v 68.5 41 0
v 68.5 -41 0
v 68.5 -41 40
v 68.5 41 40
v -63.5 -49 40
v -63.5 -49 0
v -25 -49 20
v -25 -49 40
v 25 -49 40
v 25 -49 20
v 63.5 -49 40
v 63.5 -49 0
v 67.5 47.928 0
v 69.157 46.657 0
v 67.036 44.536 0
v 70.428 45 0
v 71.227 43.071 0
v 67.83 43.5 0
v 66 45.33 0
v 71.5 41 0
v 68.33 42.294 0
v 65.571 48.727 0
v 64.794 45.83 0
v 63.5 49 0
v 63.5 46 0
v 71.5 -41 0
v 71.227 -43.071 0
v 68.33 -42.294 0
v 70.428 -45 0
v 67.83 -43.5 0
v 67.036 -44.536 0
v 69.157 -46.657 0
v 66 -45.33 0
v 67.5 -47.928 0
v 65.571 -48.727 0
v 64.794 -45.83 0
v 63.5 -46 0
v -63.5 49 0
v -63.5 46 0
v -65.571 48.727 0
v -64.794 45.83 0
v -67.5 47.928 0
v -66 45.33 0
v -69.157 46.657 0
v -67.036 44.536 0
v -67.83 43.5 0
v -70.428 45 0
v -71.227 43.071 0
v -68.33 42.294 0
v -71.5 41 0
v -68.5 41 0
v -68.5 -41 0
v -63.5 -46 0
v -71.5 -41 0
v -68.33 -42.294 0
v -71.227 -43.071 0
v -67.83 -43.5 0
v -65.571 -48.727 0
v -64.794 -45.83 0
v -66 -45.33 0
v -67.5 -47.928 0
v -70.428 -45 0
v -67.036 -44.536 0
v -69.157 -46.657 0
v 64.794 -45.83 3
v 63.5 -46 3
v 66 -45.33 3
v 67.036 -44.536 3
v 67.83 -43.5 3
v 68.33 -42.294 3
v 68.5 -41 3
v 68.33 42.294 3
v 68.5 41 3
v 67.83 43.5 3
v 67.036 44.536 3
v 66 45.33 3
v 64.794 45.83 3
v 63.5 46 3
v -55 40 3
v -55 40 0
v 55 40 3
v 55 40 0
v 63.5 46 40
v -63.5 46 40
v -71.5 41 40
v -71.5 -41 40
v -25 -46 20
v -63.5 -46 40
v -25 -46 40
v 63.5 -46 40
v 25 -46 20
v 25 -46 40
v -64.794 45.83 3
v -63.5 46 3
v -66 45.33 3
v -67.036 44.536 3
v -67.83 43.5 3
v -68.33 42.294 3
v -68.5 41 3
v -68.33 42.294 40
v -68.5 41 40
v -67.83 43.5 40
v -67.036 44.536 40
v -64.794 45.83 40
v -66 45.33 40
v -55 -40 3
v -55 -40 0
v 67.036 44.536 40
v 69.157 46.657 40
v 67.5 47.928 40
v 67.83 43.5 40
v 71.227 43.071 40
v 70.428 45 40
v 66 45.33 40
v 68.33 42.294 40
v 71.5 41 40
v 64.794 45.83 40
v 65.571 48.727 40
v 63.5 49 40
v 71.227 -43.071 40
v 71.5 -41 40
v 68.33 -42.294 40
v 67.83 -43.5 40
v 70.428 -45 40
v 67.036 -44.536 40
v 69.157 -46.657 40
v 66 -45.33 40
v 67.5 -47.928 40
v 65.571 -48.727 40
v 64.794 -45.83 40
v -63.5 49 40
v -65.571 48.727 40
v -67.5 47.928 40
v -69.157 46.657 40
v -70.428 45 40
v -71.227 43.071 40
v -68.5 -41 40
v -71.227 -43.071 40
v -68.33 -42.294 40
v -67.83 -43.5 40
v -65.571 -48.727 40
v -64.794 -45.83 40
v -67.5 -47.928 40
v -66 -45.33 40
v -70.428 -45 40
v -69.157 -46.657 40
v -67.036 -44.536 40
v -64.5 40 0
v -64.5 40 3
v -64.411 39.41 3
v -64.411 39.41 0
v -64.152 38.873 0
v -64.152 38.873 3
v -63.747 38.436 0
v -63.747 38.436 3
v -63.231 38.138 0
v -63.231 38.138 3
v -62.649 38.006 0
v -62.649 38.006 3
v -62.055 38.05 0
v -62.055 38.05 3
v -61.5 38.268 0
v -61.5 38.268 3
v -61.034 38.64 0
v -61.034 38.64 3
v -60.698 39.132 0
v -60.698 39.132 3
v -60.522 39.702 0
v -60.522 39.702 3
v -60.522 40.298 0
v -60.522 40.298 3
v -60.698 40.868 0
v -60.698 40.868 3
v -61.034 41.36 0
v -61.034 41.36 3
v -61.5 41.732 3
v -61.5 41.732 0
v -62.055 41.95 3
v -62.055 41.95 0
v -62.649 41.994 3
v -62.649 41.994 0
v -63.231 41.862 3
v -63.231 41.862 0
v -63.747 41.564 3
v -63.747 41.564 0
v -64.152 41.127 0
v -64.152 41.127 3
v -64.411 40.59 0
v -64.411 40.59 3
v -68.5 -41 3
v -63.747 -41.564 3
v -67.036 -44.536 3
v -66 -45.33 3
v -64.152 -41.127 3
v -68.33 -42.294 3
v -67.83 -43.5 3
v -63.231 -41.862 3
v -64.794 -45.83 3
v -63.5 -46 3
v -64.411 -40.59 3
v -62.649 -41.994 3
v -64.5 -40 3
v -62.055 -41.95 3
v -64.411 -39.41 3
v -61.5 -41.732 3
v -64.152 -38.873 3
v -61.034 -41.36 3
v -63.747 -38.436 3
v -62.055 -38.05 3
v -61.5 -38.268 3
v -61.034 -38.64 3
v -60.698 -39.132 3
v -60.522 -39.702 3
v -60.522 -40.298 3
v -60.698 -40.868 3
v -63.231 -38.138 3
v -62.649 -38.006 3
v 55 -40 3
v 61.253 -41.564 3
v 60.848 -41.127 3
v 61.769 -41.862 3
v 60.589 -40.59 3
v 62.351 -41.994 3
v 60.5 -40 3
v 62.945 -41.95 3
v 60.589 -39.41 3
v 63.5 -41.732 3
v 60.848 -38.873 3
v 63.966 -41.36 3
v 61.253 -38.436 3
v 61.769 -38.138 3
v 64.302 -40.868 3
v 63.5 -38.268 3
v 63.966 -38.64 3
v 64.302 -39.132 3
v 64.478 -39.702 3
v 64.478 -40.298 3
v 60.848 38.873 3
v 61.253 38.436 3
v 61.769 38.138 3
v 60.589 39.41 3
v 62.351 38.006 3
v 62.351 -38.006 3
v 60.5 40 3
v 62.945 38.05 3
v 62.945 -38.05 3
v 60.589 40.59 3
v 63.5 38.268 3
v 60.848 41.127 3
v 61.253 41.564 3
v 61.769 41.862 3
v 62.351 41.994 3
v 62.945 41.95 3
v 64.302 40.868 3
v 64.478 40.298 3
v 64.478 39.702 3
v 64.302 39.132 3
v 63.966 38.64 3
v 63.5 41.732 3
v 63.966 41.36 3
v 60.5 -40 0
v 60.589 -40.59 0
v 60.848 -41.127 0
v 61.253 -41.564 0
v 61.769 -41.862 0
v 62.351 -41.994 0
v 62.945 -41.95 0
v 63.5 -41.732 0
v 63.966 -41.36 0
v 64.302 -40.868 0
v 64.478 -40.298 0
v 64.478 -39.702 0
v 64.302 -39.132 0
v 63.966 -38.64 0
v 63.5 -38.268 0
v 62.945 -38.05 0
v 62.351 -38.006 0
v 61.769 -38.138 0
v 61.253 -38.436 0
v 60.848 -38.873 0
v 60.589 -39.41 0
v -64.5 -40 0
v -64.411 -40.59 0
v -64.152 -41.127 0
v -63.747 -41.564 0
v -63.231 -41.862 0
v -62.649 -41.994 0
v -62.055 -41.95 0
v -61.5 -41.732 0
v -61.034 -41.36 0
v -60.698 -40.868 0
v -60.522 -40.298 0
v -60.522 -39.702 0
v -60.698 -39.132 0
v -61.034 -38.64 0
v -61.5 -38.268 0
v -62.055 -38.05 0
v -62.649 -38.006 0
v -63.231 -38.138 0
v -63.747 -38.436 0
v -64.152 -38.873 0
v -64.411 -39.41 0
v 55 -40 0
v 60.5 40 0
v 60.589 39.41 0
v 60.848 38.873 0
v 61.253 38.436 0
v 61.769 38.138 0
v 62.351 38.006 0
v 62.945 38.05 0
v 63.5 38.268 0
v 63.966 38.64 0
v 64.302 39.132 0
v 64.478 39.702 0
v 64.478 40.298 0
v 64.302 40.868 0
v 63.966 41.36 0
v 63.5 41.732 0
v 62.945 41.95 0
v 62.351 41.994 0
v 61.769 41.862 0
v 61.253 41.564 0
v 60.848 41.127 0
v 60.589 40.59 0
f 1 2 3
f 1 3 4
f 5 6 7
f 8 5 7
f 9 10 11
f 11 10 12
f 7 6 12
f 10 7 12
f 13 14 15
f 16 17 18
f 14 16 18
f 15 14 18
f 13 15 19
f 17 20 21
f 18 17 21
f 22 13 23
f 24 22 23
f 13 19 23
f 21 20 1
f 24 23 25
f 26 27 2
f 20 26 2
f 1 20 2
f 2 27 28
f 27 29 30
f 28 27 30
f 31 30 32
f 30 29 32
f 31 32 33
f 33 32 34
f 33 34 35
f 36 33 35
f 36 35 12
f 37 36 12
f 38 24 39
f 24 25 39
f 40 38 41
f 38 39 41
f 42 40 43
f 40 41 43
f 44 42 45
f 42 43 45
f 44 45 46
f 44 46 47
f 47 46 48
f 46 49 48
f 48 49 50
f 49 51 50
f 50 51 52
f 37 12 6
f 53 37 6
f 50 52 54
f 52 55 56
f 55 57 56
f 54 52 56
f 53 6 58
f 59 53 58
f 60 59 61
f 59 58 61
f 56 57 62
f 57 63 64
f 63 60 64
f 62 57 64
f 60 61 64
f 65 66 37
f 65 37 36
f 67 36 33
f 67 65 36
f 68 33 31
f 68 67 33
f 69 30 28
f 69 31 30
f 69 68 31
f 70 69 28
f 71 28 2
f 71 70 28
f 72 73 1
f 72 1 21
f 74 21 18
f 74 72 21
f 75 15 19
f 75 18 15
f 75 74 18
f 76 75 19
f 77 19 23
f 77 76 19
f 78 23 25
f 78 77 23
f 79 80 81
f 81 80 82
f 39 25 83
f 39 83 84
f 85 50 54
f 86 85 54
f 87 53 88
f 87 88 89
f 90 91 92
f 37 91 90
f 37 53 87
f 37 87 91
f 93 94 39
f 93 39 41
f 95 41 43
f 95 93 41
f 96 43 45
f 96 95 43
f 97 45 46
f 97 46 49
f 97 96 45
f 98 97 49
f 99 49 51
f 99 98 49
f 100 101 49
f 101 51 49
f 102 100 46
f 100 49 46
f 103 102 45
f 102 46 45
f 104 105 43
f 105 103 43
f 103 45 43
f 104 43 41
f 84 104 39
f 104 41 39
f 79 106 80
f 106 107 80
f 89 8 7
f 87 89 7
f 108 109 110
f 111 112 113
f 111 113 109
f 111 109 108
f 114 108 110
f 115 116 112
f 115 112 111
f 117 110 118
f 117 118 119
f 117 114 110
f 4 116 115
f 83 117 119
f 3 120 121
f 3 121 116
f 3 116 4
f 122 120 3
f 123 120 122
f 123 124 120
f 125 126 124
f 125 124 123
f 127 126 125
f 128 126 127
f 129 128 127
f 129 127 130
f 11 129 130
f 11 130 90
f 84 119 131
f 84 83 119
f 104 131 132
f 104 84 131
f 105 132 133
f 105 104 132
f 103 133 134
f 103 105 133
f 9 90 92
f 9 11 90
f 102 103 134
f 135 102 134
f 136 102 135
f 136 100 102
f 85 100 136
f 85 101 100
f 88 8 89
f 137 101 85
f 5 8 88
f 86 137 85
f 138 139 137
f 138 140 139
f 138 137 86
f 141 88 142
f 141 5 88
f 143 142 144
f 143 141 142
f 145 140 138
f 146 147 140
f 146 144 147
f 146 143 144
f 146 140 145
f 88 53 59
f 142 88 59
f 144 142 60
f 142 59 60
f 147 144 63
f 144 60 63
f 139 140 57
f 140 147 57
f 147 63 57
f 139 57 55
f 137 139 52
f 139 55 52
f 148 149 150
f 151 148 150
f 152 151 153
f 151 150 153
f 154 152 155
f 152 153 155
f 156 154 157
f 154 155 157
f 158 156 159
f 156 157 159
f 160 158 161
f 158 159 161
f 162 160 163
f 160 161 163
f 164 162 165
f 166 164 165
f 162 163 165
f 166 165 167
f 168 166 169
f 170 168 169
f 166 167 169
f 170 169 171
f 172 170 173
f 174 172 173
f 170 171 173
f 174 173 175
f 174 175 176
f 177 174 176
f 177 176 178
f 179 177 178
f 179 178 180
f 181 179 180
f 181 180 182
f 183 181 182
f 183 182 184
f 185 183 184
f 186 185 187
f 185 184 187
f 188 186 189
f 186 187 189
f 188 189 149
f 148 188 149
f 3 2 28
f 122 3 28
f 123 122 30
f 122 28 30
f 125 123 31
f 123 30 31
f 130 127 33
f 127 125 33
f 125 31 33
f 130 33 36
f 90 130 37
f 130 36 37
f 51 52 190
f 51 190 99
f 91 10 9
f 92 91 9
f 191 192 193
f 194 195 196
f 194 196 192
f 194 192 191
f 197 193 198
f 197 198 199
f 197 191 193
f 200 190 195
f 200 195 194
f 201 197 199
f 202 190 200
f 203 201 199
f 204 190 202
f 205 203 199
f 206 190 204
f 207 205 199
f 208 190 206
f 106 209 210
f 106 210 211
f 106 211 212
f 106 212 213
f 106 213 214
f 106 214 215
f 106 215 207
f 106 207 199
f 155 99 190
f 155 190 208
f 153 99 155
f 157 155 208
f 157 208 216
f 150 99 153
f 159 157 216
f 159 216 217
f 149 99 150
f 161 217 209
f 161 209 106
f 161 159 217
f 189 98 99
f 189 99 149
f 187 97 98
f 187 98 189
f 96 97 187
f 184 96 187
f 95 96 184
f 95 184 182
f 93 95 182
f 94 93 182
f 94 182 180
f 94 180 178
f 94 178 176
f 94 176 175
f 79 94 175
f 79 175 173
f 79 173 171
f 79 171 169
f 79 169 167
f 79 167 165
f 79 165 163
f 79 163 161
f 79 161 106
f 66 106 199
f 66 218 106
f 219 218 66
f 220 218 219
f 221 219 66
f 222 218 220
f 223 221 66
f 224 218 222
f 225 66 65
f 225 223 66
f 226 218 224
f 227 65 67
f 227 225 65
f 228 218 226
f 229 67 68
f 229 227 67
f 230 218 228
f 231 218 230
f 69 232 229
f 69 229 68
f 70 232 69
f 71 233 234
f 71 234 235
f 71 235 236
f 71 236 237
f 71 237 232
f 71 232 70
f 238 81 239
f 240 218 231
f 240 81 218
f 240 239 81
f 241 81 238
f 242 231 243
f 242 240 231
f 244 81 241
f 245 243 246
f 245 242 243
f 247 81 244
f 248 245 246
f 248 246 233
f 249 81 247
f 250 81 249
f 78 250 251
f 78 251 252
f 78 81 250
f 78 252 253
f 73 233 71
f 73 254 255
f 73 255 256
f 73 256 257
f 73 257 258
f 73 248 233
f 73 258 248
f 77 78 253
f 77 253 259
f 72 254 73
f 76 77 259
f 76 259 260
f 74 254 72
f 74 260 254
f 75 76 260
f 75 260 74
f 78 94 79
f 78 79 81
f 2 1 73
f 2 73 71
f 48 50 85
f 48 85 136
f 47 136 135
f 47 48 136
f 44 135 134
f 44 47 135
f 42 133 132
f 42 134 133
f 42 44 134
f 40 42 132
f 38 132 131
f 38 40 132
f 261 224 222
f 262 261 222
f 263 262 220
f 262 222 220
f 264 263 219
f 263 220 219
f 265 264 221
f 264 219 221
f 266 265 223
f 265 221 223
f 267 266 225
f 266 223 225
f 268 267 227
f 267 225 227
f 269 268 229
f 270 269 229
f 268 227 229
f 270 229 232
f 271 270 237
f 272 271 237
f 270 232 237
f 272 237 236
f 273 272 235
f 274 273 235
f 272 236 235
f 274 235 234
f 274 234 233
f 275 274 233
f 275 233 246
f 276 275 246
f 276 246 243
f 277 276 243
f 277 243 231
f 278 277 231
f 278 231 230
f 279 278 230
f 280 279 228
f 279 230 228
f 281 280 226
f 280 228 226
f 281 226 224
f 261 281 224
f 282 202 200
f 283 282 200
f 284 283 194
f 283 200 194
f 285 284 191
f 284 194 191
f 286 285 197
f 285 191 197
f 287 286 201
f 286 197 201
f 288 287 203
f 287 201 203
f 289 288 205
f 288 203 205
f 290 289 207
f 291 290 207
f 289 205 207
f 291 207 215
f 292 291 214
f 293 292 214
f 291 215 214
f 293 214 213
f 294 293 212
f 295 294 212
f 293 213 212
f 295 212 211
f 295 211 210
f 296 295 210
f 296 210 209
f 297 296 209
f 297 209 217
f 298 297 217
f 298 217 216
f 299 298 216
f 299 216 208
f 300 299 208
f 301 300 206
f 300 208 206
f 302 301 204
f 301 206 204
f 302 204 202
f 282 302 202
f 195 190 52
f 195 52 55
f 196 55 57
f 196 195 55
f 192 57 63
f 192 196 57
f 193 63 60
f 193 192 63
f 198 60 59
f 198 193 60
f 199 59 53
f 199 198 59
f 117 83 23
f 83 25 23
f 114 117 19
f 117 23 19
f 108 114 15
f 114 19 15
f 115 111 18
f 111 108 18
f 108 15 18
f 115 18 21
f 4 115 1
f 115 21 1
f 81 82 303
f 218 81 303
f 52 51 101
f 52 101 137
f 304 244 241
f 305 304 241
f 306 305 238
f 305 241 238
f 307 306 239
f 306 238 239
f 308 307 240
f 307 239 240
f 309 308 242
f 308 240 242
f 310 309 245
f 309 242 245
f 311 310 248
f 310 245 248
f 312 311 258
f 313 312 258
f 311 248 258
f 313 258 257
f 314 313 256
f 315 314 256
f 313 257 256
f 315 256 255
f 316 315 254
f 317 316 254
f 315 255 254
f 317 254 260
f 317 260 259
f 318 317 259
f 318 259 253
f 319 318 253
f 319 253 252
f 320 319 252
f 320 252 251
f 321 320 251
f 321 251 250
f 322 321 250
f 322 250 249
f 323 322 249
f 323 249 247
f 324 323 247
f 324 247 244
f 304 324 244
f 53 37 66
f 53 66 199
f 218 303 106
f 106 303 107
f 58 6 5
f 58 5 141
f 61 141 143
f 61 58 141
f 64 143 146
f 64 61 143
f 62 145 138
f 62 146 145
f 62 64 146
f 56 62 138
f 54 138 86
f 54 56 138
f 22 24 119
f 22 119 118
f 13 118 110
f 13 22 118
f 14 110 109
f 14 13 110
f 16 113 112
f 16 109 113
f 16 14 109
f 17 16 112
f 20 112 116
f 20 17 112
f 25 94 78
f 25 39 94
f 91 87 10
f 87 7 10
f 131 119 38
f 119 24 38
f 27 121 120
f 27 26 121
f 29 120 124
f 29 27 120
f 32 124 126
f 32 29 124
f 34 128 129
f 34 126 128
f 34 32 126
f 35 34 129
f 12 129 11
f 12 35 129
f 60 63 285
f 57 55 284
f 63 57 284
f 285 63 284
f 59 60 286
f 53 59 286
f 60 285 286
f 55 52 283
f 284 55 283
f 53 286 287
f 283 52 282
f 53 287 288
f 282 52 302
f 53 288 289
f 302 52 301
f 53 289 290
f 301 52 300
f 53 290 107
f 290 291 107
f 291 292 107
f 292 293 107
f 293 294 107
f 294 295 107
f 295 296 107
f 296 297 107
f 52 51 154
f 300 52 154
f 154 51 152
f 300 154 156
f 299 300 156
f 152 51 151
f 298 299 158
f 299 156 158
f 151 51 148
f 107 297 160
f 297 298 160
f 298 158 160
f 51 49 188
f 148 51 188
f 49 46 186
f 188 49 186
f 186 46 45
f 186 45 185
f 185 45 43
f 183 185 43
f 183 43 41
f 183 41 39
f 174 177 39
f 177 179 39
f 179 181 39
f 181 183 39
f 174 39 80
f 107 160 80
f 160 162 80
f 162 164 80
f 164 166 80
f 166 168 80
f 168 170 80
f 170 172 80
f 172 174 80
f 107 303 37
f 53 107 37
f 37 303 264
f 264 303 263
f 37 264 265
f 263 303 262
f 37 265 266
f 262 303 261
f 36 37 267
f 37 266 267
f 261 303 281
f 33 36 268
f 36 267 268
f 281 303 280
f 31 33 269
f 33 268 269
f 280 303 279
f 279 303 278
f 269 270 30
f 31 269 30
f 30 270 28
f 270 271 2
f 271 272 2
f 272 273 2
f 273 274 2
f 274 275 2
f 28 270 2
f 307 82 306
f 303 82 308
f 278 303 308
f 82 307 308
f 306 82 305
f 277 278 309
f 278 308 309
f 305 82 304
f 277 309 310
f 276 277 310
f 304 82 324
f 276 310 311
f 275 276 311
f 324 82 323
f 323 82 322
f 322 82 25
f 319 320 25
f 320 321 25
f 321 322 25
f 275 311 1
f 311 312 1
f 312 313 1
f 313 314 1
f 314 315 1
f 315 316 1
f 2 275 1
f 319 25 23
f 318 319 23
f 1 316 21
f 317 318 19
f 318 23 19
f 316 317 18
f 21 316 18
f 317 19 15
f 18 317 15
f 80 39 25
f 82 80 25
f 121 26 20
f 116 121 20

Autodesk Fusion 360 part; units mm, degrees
sketch "Boceto1" plane through (0, 0, 0) normal (0, 0, 1) x (1, 0, 0)
  line L0 (-68.5, 46) -> (68.5, 46)
  line L1 (68.5, 46) -> (68.5, -46)
  line L2 (68.5, -46) -> (-68.5, -46)
  line L3 (-68.5, -46) -> (-68.5, 46)
  line L4 (-68.5, 46) -> (68.5, -46) construction
  line L5 (68.5, 46) -> (-68.5, -46) construction
  dimension "d1" = 137
  dimension "d2" = 92
extrude "Extruir1" add sketch "Boceto1" along normal blind 3 makes body 1
sketch "Boceto2" plane through (0, 0, 3) normal (0, 0, 1) x (-1, 0, 0)
  line L0 (68.5, 46) -> (-68.5, 46)
  line L1 (-68.5, 46) -> (-68.5, -46)
  line L2 (-68.5, -46) -> (68.5, -46)
  line L3 (68.5, -46) -> (68.5, 46)
  line L4 (68.5, -46) -> (62.5, -46)
  line L5 (62.5, -46) -> (62.5, -40)
  line L6 (-68.5, -46) -> (-62.5, -46)
  line L7 (-62.5, -46) -> (-62.5, -40)
  line L8 (68.5, 46) -> (62.5, 46)
  line L9 (62.5, 46) -> (62.5, 40)
  line L10 (-68.5, 46) -> (-68.5, 40)
  line L11 (-68.5, 40) -> (-62.5, 40)
  circle A0 centre (62.5, -40) radius 2
  circle A1 centre (62.5, 40) radius 2
  circle A2 centre (-62.5, -40) radius 2
  circle A3 centre (-62.5, 40) radius 2
  dimension "d5" = 6
  dimension "d6" = 6
  dimension "d7" = 6
  dimension "d8" = 6
  dimension "d9" = 6
  dimension "d10" = 6
  dimension "d11" = 6
  dimension "d12" = 6
  dimension "d13" = 4
  dimension "d14" = 4
  dimension "d15" = 4
  dimension "d16" = 4
extrude "Extruir2" cut sketch "Boceto2" against normal blind 3 contours A1 | A3 | A2 | A0 bodies 1
fillet "Empalme1" radius 5 4 edges at (-68.5, -46, 1.5) (68.5, -46, 1.5) (68.5, 46, 1.5) (-68.5, 46, 1.5) on bodies 1
sketch "Boceto3" plane through (0, 0, 3) normal (0, 0, 1) x (-1, 0, 0)
  circle A0 centre (62.5, -40) radius 2
  circle A1 centre (-62.5, -40) radius 2
  circle A2 centre (62.5, 40) radius 2
  circle A3 centre (-62.5, 40) radius 2
  arc A4 (63.5, -46) -> (68.5, -41) centre (63.5, -41) ccw
  line L0 (68.5, -41) -> (68.5, 41)
  arc A5 (68.5, 41) -> (63.5, 46) centre (63.5, 41) ccw
  line L1 (63.5, 46) -> (-63.5, 46)
  arc A6 (-63.5, 46) -> (-68.5, 41) centre (-63.5, 41) ccw
  line L2 (-68.5, 41) -> (-68.5, -41)
  arc A7 (-68.5, -41) -> (-63.5, -46) centre (-63.5, -41) ccw
  line L3 (-63.5, -46) -> (63.5, -46)
  line L4 (-71.5, 41) -> (-71.5, -41)
  arc A8 (-71.5, -41) -> (-63.5, -49) centre (-63.5, -41) ccw
  line L5 (-63.5, -49) -> (63.5, -49)
  arc A9 (63.5, -49) -> (71.5, -41) centre (63.5, -41) ccw
  line L6 (71.5, -41) -> (71.5, 41)
  arc A10 (71.5, 41) -> (63.5, 49) centre (63.5, 41) ccw
  line L7 (63.5, 49) -> (-63.5, 49)
  arc A11 (-63.5, 49) -> (-71.5, 41) centre (-63.5, 41) ccw
  dimension "d21" = 3
extrude "Extruir3" add sketch "Boceto3" along normal blind 37 and the other way blind 3 separate body contours L4 A8 L5 A9 L6 A10 L7 A11 makes body 2
sketch "Boceto5" plane through (0, 0, 0) normal (0, 0, -1) x (1, 0, 0)
  arc A0 (-68.5, -41) -> (-63.5, -46) centre (-63.5, -41) ccw
  line L0 (-63.5, -46) -> (63.5, -46)
  arc A1 (63.5, -46) -> (68.5, -41) centre (63.5, -41) ccw
  line L1 (68.5, -41) -> (68.5, 41)
  arc A2 (68.5, 41) -> (63.5, 46) centre (63.5, 41) ccw
  line L2 (63.5, 46) -> (-63.5, 46)
  arc A3 (-63.5, 46) -> (-68.5, 41) centre (-63.5, 41) ccw
  line L3 (-68.5, 41) -> (-68.5, -41)
  circle A4 centre (-62.5, -40) radius 2
  circle A5 centre (62.5, -40) radius 2
  circle A6 centre (-62.5, 40) radius 2
  circle A7 centre (62.5, 40) radius 2
  line L4 (55, 40) -> (-55, 40)
  line L5 (-55, 40) -> (-55, -40)
  line L6 (-55, -40) -> (55, -40)
  line L7 (55, -40) -> (55, 40)
  line L8 (55, 40) -> (-55, -40) construction
  line L9 (-55, 40) -> (55, -40) construction
  dimension "d32" = 110
  dimension "d33" = 80
extrude "Extruir5" cut sketch "Boceto5" against normal blind 3 contours L4 L5 L6 L7 bodies 1
sketch "Boceto6" plane through (0, -49, 0) normal (0, -1, 0) x (1, 0, 0)
  line L0 (63.5, 0) -> (63.5, 40)
  line L1 (63.5, 40) -> (-63.5, 40)
  line L2 (-63.5, 40) -> (-63.5, 0)
  line L3 (-63.5, 0) -> (63.5, 0)
  line L4 (25, 40) -> (-25, 40)
  line L5 (-25, 40) -> (-25, 20)
  line L6 (-25, 20) -> (25, 20)
  line L7 (25, 20) -> (25, 40)
  point P0 (0, 40)
  dimension "d36" = 50
extrude "Extruir6" cut sketch "Boceto6" against normal blind 5 contours L1 L4 L5 L6 L7 bodies 2
